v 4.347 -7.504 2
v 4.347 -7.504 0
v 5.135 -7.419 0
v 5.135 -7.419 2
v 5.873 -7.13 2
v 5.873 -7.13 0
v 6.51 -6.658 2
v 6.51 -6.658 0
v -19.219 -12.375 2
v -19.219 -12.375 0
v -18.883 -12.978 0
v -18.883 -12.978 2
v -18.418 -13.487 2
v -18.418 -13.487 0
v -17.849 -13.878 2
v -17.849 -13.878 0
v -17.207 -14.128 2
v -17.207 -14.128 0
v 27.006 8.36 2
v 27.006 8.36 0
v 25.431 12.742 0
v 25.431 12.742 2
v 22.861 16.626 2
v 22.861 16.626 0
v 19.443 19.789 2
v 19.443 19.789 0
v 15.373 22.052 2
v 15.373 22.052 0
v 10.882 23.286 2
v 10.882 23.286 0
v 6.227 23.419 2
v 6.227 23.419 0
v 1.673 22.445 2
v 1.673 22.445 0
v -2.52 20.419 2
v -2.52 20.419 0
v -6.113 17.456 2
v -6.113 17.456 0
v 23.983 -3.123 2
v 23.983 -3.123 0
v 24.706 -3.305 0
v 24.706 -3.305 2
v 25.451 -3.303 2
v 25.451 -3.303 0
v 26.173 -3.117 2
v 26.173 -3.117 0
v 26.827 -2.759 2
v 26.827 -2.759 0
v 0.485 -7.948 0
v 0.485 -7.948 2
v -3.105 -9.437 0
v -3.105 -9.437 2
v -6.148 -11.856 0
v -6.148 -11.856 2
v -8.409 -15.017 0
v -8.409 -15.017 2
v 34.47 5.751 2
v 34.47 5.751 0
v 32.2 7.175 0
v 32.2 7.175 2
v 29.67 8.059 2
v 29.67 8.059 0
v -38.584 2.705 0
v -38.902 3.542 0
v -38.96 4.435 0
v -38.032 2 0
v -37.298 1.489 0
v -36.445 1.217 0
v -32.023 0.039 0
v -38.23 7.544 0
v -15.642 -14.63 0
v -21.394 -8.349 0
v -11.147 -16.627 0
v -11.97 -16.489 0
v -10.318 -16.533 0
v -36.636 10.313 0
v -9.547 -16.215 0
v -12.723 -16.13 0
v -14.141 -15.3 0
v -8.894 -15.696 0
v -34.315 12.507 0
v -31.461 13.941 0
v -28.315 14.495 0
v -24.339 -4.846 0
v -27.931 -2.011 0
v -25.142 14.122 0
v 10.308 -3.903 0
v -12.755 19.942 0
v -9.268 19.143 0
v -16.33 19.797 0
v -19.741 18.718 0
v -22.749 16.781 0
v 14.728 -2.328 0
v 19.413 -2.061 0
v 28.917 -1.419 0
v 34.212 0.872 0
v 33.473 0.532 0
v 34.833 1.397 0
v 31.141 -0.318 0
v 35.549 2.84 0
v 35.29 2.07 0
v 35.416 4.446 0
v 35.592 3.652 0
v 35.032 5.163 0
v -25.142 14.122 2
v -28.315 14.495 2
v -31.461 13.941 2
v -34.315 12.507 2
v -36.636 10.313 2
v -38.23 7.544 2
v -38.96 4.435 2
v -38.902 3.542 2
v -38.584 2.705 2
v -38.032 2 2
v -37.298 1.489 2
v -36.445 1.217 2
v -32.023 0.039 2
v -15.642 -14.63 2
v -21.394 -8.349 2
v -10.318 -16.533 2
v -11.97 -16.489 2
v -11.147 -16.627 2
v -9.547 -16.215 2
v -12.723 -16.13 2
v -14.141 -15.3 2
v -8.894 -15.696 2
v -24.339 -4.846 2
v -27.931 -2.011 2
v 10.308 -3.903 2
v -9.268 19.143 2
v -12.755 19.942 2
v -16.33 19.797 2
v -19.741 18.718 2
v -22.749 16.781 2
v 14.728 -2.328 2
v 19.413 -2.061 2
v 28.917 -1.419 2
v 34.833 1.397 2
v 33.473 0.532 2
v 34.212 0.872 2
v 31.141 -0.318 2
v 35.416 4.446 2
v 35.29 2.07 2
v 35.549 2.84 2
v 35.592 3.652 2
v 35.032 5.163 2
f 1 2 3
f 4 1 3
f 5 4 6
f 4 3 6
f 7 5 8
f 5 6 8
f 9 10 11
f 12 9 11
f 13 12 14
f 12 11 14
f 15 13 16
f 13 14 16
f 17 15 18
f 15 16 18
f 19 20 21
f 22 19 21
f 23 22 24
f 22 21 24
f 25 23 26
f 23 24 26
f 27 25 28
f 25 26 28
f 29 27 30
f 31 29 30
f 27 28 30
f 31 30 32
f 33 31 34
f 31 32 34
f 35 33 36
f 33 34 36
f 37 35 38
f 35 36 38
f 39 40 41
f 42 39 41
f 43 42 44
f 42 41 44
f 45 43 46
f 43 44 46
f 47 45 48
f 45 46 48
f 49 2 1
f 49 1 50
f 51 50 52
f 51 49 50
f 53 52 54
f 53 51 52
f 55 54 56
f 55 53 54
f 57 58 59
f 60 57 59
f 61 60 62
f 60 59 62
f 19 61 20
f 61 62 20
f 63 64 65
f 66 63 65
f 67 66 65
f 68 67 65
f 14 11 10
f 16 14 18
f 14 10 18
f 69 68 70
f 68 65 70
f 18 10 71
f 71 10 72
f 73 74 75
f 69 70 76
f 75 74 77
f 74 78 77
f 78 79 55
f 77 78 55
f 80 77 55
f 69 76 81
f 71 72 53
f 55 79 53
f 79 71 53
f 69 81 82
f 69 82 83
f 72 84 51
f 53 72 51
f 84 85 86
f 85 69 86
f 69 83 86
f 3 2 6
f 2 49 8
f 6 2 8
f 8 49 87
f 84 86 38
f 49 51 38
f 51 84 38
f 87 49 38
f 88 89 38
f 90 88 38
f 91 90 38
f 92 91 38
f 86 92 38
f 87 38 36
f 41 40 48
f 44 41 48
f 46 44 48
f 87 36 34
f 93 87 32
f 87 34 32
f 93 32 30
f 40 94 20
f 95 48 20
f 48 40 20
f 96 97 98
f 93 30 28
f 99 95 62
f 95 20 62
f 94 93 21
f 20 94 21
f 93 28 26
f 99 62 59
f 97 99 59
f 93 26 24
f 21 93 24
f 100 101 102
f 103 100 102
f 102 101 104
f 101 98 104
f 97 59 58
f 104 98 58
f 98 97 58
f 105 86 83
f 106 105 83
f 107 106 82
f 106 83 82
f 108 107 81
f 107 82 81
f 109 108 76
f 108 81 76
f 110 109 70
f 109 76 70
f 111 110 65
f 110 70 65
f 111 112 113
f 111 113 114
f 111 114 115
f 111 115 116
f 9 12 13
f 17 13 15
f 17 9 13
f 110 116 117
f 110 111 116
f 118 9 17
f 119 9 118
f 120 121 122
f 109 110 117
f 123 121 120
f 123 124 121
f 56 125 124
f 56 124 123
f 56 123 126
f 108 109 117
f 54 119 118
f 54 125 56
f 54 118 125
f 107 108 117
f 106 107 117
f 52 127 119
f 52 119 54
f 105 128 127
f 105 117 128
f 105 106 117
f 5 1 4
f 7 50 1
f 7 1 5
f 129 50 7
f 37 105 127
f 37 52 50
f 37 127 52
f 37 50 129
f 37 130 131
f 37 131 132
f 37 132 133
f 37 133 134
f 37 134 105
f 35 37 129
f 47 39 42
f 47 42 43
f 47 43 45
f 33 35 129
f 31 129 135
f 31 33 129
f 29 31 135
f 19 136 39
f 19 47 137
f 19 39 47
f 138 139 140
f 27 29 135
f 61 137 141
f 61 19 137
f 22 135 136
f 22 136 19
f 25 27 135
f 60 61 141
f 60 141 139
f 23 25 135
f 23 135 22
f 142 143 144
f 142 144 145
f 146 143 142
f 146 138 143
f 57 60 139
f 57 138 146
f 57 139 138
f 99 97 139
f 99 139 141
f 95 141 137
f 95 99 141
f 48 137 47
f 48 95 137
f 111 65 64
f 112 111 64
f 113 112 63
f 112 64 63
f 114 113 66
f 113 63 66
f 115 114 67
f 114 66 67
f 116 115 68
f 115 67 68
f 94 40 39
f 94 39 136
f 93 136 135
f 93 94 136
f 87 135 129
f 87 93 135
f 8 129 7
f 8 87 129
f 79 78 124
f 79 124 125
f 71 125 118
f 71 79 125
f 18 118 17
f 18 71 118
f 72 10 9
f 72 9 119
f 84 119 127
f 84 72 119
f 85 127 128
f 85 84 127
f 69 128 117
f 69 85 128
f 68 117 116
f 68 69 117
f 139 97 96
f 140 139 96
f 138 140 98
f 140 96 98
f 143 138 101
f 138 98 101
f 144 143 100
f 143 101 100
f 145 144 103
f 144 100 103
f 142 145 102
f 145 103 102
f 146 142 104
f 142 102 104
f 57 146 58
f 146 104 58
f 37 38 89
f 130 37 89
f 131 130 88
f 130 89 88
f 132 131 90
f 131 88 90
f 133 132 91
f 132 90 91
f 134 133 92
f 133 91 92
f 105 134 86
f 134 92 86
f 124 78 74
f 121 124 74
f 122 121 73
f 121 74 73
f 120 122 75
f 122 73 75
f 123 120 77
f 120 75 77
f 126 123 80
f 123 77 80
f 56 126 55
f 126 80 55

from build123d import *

# Parameters (mm, degrees)
PAD_DEPTH = 2


with BuildPart() as part:
    # Sketch → Pad (new body)
    with BuildSketch(Plane.XY):
        with BuildLine():
            ThreePointArc((-25.14228, 14.122309), (-34.314711, 12.50691), (-38.960225, 4.4346))
            ThreePointArc((-38.960225, 4.4346), (-38.334534, 2.331994), (-36.445064, 1.21739))
            ThreePointArc((-19.218733, -12.375098), (-26.062582, -3.336524), (-36.445064, 1.21739))
            ThreePointArc((-19.218733, -12.375098), (-18.418224, -13.487369), (-17.206581, -14.127592))
            ThreePointArc((-12.723117, -16.130275), (-14.882343, -14.944224), (-17.206581, -14.127592))
            ThreePointArc((-12.723117, -16.130275), (-10.318463, -16.533254), (-8.408728, -15.017448))
            ThreePointArc((4.346508, -7.504289), (-3.105363, -9.437089), (-8.408728, -15.017448))
            ThreePointArc((4.346508, -7.504289), (5.513399, -7.299154), (6.509873, -6.658253))
            ThreePointArc((23.982965, -3.122935), (14.727871, -2.327704), (6.509873, -6.658253))
            ThreePointArc((23.982965, -3.122935), (25.451337, -3.302873), (26.827171, -2.759206))
            ThreePointArc((33.472919, 0.532469), (30.01349, -0.837668), (26.827171, -2.759206))
            ThreePointArc((33.472919, 0.532469), (35.549324, 2.84038), (34.47019, 5.751287))
            ThreePointArc((34.47019, 5.751287), (30.959282, 7.688022), (27.006326, 8.359998))
            ThreePointArc((27.006326, 8.359998), (13.164565, 22.80365), (-6.112904, 17.456446))
            ThreePointArc((-6.112904, 17.456446), (-16.329844, 19.797437), (-25.14228, 14.122309))
        make_face()
    extrude(amount=PAD_DEPTH)


solid = part.part
